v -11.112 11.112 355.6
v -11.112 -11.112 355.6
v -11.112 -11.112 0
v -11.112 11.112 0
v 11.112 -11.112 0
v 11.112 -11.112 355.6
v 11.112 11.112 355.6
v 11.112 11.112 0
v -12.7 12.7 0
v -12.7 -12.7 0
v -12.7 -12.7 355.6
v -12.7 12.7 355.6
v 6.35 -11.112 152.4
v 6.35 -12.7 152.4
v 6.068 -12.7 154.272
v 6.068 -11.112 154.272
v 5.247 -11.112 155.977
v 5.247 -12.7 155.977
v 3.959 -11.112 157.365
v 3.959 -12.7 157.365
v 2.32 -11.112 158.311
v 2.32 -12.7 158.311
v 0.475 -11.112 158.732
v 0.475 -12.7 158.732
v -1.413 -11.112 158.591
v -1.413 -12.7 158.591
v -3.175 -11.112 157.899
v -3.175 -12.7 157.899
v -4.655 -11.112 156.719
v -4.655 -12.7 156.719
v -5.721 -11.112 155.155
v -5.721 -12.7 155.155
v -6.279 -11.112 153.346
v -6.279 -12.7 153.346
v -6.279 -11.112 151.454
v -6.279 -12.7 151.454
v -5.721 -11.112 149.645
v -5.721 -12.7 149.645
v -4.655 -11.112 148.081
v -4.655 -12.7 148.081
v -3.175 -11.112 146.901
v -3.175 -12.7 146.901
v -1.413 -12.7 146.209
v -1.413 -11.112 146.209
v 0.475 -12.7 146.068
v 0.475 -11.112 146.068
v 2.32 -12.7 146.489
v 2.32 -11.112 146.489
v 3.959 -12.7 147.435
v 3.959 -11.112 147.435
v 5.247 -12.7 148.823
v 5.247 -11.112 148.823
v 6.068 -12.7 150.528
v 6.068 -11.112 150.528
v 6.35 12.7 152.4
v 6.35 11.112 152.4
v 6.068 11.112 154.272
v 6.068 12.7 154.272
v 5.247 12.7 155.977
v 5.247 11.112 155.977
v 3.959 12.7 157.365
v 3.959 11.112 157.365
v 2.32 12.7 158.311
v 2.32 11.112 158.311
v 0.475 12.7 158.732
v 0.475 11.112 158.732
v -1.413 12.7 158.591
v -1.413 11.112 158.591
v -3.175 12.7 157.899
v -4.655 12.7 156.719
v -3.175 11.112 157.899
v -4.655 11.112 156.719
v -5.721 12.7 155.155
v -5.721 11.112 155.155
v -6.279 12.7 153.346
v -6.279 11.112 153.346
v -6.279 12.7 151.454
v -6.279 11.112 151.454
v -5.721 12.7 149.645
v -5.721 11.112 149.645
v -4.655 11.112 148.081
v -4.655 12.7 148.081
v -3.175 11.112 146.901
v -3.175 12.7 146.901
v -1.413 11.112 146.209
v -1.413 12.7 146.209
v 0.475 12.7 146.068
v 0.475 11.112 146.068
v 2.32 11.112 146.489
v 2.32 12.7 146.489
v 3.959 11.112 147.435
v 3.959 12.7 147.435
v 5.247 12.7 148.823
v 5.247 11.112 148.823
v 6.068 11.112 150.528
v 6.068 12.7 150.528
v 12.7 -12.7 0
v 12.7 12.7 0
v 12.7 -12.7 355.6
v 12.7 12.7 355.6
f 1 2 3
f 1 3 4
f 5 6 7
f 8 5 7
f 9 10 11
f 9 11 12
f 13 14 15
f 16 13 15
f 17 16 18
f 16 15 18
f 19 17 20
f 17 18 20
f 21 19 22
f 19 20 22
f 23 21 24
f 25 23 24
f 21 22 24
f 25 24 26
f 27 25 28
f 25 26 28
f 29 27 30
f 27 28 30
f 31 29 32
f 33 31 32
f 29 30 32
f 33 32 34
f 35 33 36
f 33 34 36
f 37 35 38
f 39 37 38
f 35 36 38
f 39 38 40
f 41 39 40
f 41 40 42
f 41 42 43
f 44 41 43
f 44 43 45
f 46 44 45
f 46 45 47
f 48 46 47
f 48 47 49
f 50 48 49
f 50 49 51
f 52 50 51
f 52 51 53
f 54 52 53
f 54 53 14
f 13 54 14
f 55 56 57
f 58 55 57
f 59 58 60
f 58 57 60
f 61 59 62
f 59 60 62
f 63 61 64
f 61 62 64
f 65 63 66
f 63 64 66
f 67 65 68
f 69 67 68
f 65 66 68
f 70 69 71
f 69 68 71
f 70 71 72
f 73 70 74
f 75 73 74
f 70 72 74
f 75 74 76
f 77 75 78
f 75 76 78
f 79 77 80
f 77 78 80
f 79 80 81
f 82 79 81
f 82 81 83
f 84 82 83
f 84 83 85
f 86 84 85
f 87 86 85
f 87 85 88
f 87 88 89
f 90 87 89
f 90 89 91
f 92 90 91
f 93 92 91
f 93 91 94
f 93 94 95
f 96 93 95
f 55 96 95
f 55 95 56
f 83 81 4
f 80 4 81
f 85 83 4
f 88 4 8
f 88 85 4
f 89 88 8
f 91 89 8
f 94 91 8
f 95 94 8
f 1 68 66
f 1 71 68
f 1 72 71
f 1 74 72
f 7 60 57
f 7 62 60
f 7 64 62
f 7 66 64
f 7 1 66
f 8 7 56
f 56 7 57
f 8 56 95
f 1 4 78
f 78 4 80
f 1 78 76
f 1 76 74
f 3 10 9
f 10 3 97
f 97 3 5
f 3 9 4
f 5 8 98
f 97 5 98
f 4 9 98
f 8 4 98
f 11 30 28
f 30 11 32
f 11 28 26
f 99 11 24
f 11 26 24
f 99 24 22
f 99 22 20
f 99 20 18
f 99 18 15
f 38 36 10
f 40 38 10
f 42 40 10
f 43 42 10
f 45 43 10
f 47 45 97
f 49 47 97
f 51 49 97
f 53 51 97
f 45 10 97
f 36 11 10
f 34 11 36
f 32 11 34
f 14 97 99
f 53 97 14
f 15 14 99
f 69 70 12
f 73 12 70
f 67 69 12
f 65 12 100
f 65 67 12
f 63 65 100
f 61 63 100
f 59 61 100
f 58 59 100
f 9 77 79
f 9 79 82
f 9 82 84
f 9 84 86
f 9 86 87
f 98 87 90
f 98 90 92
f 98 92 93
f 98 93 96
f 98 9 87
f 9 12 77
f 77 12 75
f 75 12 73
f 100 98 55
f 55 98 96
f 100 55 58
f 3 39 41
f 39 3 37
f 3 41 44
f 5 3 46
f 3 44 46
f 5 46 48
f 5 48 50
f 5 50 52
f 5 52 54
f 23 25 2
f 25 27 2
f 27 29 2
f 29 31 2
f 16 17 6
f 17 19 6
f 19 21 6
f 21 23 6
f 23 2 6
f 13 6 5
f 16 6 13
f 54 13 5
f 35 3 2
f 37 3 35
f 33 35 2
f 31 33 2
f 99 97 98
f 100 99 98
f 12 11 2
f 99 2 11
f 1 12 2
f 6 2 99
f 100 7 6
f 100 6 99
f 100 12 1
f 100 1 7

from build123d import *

# Parameters (mm, degrees)
F1_W     = 25.4
F1_H     = 25.4
F2_DEPTH = 355.6
F3_T     = -1.5875
F4_DEPTH = 1.5885
F5_R     = 6.35
F6_DEPTH = 25.401


# Not quite as in the source:
# - a variable given as a bare number and used for a length is read in inches; the dataset says mm whatever the document's units were


with BuildPart() as f2:
    # F1 (on Top) → F2 (new body)
    with BuildSketch(Plane.XY):
        Rectangle(F1_W, F1_H)
    extrude(amount=F2_DEPTH)

    # F3
    f3_openings = [f2.faces().sort_by_distance(p)[0] for p in [
        (0, 0, 355.6),
    ]]
    offset(amount=F3_T, openings=f3_openings)

    # F4 (cut, through all): a face of the model
    f4_faces = [f2.faces().sort_by_distance(p)[0] for p in [
        (0, 0, 1.5875),
    ]]
    extrude(f4_faces, amount=-F4_DEPTH, mode=Mode.SUBTRACT)

    # F5 (on face) → F6 (cut, through all)
    with BuildSketch(Plane.XZ.offset(12.7)):
        with Locations((0, 152.4)):
            Circle(F5_R)
    extrude(amount=-F6_DEPTH, mode=Mode.SUBTRACT)


solid = f2.part
